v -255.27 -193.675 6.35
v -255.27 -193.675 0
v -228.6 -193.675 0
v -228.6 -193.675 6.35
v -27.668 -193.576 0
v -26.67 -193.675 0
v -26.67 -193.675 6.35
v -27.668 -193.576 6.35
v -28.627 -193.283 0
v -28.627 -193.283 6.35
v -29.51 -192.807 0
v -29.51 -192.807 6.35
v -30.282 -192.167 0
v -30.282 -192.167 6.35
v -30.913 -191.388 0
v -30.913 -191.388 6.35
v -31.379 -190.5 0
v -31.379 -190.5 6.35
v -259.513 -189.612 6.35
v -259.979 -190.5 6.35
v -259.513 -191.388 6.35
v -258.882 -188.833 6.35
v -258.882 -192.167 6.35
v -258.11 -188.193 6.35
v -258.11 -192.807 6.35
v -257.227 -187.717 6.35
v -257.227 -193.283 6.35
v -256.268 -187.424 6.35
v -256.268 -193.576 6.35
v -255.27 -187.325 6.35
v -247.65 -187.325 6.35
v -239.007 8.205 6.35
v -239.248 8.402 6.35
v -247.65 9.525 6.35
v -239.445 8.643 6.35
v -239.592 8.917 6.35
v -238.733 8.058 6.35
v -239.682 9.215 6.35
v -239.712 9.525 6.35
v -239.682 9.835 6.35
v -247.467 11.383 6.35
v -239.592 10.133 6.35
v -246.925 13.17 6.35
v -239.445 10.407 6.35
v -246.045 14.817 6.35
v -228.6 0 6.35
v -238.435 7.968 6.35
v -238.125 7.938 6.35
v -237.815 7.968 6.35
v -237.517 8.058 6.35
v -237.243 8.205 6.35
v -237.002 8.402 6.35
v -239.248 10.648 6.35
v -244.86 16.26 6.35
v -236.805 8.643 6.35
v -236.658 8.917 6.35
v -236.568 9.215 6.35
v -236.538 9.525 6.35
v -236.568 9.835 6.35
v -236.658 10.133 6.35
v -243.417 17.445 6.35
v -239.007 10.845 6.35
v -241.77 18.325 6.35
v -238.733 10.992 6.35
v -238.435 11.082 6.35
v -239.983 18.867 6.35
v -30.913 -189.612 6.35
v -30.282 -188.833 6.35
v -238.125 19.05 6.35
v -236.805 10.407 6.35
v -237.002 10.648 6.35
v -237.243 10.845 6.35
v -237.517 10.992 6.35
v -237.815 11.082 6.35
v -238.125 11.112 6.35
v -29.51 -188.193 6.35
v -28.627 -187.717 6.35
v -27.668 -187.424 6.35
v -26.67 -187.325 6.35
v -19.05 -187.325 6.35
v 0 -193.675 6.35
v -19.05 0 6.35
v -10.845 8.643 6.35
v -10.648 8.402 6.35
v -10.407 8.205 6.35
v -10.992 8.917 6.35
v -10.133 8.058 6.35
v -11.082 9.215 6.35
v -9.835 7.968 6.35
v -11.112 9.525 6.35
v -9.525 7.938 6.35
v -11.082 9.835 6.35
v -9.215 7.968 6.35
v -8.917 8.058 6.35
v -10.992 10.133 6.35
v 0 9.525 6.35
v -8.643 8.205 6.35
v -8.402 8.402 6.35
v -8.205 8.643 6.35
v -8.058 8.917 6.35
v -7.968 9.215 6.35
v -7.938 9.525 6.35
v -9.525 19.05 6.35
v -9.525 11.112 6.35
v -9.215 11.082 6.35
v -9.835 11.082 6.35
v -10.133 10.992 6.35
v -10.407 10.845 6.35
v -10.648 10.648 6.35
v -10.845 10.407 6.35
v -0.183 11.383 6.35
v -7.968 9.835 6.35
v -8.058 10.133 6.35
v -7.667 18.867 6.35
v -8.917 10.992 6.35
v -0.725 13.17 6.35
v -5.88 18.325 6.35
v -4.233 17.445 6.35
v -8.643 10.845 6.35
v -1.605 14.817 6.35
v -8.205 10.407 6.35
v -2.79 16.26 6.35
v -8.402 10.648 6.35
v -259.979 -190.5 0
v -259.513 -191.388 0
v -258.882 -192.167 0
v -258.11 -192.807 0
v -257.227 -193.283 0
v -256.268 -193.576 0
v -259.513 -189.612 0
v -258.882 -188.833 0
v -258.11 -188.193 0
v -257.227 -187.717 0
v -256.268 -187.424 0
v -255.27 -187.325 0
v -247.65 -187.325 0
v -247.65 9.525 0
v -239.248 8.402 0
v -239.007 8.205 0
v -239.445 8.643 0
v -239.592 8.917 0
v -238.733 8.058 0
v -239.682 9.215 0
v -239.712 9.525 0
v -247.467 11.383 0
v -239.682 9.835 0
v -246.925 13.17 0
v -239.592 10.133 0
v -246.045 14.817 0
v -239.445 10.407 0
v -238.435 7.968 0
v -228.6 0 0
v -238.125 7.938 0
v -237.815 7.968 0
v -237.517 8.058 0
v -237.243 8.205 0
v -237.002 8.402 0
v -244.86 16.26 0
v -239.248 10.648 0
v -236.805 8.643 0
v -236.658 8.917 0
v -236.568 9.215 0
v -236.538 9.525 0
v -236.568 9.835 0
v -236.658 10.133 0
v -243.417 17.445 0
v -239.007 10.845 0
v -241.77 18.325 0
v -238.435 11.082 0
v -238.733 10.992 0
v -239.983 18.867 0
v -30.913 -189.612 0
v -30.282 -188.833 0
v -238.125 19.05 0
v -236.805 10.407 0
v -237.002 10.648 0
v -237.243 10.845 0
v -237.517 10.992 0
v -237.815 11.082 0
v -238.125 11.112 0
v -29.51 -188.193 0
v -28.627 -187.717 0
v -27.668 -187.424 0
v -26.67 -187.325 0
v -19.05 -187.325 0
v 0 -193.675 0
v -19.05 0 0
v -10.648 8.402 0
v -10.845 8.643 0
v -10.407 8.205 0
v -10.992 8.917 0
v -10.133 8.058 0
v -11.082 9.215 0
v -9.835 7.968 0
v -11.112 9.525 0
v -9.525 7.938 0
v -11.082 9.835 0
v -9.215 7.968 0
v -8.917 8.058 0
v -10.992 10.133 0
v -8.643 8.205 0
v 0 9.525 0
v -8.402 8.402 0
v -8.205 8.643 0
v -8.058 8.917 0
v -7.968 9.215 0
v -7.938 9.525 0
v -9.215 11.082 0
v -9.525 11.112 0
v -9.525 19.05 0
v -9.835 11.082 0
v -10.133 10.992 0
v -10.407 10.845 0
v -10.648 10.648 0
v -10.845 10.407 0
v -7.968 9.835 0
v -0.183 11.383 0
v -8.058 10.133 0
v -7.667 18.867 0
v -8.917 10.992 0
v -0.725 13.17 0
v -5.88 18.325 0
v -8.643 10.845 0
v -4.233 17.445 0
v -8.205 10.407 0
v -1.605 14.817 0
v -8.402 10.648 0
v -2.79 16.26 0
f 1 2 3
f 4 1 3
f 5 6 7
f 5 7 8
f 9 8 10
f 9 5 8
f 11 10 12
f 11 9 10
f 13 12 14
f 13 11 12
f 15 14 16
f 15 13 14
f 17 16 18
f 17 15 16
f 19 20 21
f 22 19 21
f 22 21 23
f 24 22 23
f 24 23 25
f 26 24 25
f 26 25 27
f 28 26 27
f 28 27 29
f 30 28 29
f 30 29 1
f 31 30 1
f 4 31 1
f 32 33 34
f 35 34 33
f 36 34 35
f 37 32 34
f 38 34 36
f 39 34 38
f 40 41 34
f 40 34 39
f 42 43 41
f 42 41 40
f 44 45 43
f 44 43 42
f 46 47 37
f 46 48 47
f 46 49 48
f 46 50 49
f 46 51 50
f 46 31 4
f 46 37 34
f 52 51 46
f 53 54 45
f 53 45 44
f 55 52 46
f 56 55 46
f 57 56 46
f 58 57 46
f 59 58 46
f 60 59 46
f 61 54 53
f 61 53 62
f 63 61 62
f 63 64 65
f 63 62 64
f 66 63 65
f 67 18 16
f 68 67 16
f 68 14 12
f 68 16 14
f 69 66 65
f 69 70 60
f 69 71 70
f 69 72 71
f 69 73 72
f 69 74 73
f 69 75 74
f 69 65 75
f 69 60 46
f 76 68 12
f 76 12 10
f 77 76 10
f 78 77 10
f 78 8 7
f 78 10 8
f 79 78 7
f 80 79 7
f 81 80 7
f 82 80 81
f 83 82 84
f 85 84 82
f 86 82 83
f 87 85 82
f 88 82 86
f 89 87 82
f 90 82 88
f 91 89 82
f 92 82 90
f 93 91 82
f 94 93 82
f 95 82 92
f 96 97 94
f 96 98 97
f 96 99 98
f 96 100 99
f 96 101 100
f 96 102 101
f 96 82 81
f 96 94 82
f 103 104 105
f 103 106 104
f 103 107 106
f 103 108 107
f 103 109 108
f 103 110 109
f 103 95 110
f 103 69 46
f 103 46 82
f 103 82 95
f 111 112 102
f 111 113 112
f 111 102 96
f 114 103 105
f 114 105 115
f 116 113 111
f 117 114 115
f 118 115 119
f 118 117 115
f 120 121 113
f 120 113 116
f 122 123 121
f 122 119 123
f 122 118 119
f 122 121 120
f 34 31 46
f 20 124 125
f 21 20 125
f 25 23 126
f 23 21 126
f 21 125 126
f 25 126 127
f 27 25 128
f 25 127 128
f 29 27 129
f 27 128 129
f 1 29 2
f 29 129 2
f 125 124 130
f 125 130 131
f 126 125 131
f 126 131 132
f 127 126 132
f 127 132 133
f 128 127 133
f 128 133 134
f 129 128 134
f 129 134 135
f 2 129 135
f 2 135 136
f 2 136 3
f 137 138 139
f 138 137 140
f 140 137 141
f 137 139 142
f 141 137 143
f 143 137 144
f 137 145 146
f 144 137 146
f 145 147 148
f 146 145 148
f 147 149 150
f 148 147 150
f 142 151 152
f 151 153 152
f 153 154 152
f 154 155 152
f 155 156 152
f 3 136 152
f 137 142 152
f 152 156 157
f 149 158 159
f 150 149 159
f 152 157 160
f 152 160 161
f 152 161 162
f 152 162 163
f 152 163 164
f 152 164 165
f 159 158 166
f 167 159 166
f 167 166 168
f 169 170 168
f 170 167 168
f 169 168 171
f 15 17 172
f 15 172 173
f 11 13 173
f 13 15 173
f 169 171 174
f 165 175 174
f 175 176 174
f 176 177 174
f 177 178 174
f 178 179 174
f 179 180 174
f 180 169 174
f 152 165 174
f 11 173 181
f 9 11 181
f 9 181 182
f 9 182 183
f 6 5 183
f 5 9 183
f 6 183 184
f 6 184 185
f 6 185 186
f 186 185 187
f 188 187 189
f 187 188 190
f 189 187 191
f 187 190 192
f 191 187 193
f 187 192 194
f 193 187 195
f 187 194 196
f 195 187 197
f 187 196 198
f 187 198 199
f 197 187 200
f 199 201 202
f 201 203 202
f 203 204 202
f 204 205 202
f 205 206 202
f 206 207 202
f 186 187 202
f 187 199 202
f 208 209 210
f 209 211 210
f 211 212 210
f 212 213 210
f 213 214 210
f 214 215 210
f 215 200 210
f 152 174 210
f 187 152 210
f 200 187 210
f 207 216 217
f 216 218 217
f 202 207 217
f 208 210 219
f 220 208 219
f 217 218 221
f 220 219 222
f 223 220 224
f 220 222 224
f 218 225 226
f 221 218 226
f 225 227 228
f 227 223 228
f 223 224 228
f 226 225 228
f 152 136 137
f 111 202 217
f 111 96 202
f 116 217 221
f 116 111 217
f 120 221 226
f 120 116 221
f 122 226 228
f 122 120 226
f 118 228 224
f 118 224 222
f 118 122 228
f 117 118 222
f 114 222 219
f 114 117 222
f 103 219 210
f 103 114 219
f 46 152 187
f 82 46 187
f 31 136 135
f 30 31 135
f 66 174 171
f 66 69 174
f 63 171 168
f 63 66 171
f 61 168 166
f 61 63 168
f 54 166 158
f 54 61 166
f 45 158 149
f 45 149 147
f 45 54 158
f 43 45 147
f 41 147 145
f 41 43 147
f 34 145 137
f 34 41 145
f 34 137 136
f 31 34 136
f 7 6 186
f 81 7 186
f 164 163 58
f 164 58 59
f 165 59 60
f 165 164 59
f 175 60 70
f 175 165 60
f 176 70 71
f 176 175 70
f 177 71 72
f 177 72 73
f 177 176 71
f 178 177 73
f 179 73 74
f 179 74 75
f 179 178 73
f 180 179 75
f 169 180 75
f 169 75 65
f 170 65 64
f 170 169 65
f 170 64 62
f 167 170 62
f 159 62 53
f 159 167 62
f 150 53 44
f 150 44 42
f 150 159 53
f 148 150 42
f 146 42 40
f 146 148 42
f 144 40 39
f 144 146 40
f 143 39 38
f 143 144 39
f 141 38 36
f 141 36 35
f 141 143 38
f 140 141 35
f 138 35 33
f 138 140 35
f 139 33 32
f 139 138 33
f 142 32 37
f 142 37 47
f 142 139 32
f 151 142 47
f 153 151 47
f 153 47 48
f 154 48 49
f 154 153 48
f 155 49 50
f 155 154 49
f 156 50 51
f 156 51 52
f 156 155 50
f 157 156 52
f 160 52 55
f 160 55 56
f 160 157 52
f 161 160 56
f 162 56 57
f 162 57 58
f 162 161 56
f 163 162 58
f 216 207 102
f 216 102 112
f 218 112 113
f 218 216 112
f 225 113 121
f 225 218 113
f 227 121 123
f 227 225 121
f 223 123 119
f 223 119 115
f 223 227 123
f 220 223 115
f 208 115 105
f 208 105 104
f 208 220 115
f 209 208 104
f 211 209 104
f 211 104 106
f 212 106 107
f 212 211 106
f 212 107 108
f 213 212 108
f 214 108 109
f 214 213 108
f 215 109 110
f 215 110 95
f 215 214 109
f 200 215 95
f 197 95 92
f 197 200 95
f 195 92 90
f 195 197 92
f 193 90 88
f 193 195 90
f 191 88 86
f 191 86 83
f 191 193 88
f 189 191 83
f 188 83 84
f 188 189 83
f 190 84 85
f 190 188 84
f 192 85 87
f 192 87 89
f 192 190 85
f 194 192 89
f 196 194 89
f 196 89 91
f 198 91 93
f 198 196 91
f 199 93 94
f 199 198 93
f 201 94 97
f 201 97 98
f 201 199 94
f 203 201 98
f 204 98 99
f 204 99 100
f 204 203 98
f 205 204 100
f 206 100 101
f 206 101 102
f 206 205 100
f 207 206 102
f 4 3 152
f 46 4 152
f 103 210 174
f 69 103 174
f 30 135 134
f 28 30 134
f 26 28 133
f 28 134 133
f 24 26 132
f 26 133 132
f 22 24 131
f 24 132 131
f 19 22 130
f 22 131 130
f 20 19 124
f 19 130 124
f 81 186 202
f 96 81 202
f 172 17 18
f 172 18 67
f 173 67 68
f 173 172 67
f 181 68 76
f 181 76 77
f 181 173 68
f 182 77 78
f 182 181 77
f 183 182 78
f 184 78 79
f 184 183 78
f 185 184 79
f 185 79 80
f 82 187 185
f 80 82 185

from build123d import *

# Parameters (mm, degrees)
F0_W        = 12.7
F0_H        = 6.35
F0_W_2      = 19.05
F0_H_2      = 187.325
F0_H_3      = 19.05
F0_R        = 1.5875
F0_W_3      = 209.55
F1_DEPTH    = 6.35
F2_R        = 9.525
F3_T1_DEPTH = 31.75


# Not quite as in the source:
# - a fillet or chamfer that OpenCascade refuses, or shapes differently, is made with other operations: its cross-section is extruded or revolved along the edge and cut away or added
# - a length typed as a fraction of an inch, garbled in the dataset ("3 / 203.2 mm" for 3/8 in), is restored


with BuildPart() as f1:
    # F0 (on Top) → F1 (new body)
    with BuildSketch(Plane.XY):
        with Locations((-254, -190.5)):
            Rectangle(F0_W, F0_H)
        with Locations((-238.125, -190.5)):
            Rectangle(F0_W_2, F0_H)
        with Locations((-238.125, -93.6625)):
            Rectangle(F0_W_2, F0_H_2)
        with Locations((-238.125, 9.525)):
            Rectangle(F0_W_2, F0_H_3)
        with Locations((-238.125, 9.525)):
            Circle(F0_R, mode=Mode.SUBTRACT)
        with Locations((-123.825, 9.525)):
            Rectangle(F0_W_3, F0_H_3)
        with Locations((-9.525, 9.525)):
            Rectangle(F0_W_2, F0_H_3)
        with Locations((-9.525, 9.525)):
            Circle(F0_R, mode=Mode.SUBTRACT)
        with Locations((-9.525, -93.6625)):
            Rectangle(F0_W_2, F0_H_2)
        with Locations((-9.525, -190.5)):
            Rectangle(F0_W_2, F0_H)
        with Locations((-25.4, -190.5)):
            Rectangle(F0_W, F0_H)
    extrude(amount=F1_DEPTH)

    # F2
    f2_edges = [f1.edges().sort_by_distance(p)[0] for p in [
        (0, 19.05, 3.175),
        (-247.65, 19.05, 3.175),
    ]]
    fillet(f2_edges, radius=F2_R)

    # F3: fillet of radius 5.08 on 4 edges, made by hand

    # F3_s2 → F3_t1 (cut)
    with BuildSketch(Plane.XY.offset(-12.7)):
        with BuildLine():
            ThreePointArc((-255.27, -187.325), (-258.8621024484, -188.8128975516), (-260.35, -192.405))
            Line((-260.35, -192.405), (-260.35, -187.325))
            Line((-260.35, -187.325), (-255.27, -187.325))
        make_face()
        with BuildLine():
            ThreePointArc((-31.75, -192.405), (-30.2621024484, -188.8128975516), (-26.67, -187.325))
            Line((-26.67, -187.325), (-31.75, -187.325))
            Line((-31.75, -187.325), (-31.75, -192.405))
        make_face()
        with BuildLine():
            ThreePointArc((-260.35, -188.595), (-258.8621024484, -192.1871024484), (-255.27, -193.675))
            Line((-255.27, -193.675), (-260.35, -193.675))
            Line((-260.35, -193.675), (-260.35, -188.595))
        make_face()
        with BuildLine():
            ThreePointArc((-26.67, -193.675), (-30.2621024484, -192.1871024484), (-31.75, -188.595))
            Line((-31.75, -188.595), (-31.75, -193.675))
            Line((-31.75, -193.675), (-26.67, -193.675))
        make_face()
    extrude(amount=F3_T1_DEPTH, mode=Mode.SUBTRACT)


solid = f1.part
